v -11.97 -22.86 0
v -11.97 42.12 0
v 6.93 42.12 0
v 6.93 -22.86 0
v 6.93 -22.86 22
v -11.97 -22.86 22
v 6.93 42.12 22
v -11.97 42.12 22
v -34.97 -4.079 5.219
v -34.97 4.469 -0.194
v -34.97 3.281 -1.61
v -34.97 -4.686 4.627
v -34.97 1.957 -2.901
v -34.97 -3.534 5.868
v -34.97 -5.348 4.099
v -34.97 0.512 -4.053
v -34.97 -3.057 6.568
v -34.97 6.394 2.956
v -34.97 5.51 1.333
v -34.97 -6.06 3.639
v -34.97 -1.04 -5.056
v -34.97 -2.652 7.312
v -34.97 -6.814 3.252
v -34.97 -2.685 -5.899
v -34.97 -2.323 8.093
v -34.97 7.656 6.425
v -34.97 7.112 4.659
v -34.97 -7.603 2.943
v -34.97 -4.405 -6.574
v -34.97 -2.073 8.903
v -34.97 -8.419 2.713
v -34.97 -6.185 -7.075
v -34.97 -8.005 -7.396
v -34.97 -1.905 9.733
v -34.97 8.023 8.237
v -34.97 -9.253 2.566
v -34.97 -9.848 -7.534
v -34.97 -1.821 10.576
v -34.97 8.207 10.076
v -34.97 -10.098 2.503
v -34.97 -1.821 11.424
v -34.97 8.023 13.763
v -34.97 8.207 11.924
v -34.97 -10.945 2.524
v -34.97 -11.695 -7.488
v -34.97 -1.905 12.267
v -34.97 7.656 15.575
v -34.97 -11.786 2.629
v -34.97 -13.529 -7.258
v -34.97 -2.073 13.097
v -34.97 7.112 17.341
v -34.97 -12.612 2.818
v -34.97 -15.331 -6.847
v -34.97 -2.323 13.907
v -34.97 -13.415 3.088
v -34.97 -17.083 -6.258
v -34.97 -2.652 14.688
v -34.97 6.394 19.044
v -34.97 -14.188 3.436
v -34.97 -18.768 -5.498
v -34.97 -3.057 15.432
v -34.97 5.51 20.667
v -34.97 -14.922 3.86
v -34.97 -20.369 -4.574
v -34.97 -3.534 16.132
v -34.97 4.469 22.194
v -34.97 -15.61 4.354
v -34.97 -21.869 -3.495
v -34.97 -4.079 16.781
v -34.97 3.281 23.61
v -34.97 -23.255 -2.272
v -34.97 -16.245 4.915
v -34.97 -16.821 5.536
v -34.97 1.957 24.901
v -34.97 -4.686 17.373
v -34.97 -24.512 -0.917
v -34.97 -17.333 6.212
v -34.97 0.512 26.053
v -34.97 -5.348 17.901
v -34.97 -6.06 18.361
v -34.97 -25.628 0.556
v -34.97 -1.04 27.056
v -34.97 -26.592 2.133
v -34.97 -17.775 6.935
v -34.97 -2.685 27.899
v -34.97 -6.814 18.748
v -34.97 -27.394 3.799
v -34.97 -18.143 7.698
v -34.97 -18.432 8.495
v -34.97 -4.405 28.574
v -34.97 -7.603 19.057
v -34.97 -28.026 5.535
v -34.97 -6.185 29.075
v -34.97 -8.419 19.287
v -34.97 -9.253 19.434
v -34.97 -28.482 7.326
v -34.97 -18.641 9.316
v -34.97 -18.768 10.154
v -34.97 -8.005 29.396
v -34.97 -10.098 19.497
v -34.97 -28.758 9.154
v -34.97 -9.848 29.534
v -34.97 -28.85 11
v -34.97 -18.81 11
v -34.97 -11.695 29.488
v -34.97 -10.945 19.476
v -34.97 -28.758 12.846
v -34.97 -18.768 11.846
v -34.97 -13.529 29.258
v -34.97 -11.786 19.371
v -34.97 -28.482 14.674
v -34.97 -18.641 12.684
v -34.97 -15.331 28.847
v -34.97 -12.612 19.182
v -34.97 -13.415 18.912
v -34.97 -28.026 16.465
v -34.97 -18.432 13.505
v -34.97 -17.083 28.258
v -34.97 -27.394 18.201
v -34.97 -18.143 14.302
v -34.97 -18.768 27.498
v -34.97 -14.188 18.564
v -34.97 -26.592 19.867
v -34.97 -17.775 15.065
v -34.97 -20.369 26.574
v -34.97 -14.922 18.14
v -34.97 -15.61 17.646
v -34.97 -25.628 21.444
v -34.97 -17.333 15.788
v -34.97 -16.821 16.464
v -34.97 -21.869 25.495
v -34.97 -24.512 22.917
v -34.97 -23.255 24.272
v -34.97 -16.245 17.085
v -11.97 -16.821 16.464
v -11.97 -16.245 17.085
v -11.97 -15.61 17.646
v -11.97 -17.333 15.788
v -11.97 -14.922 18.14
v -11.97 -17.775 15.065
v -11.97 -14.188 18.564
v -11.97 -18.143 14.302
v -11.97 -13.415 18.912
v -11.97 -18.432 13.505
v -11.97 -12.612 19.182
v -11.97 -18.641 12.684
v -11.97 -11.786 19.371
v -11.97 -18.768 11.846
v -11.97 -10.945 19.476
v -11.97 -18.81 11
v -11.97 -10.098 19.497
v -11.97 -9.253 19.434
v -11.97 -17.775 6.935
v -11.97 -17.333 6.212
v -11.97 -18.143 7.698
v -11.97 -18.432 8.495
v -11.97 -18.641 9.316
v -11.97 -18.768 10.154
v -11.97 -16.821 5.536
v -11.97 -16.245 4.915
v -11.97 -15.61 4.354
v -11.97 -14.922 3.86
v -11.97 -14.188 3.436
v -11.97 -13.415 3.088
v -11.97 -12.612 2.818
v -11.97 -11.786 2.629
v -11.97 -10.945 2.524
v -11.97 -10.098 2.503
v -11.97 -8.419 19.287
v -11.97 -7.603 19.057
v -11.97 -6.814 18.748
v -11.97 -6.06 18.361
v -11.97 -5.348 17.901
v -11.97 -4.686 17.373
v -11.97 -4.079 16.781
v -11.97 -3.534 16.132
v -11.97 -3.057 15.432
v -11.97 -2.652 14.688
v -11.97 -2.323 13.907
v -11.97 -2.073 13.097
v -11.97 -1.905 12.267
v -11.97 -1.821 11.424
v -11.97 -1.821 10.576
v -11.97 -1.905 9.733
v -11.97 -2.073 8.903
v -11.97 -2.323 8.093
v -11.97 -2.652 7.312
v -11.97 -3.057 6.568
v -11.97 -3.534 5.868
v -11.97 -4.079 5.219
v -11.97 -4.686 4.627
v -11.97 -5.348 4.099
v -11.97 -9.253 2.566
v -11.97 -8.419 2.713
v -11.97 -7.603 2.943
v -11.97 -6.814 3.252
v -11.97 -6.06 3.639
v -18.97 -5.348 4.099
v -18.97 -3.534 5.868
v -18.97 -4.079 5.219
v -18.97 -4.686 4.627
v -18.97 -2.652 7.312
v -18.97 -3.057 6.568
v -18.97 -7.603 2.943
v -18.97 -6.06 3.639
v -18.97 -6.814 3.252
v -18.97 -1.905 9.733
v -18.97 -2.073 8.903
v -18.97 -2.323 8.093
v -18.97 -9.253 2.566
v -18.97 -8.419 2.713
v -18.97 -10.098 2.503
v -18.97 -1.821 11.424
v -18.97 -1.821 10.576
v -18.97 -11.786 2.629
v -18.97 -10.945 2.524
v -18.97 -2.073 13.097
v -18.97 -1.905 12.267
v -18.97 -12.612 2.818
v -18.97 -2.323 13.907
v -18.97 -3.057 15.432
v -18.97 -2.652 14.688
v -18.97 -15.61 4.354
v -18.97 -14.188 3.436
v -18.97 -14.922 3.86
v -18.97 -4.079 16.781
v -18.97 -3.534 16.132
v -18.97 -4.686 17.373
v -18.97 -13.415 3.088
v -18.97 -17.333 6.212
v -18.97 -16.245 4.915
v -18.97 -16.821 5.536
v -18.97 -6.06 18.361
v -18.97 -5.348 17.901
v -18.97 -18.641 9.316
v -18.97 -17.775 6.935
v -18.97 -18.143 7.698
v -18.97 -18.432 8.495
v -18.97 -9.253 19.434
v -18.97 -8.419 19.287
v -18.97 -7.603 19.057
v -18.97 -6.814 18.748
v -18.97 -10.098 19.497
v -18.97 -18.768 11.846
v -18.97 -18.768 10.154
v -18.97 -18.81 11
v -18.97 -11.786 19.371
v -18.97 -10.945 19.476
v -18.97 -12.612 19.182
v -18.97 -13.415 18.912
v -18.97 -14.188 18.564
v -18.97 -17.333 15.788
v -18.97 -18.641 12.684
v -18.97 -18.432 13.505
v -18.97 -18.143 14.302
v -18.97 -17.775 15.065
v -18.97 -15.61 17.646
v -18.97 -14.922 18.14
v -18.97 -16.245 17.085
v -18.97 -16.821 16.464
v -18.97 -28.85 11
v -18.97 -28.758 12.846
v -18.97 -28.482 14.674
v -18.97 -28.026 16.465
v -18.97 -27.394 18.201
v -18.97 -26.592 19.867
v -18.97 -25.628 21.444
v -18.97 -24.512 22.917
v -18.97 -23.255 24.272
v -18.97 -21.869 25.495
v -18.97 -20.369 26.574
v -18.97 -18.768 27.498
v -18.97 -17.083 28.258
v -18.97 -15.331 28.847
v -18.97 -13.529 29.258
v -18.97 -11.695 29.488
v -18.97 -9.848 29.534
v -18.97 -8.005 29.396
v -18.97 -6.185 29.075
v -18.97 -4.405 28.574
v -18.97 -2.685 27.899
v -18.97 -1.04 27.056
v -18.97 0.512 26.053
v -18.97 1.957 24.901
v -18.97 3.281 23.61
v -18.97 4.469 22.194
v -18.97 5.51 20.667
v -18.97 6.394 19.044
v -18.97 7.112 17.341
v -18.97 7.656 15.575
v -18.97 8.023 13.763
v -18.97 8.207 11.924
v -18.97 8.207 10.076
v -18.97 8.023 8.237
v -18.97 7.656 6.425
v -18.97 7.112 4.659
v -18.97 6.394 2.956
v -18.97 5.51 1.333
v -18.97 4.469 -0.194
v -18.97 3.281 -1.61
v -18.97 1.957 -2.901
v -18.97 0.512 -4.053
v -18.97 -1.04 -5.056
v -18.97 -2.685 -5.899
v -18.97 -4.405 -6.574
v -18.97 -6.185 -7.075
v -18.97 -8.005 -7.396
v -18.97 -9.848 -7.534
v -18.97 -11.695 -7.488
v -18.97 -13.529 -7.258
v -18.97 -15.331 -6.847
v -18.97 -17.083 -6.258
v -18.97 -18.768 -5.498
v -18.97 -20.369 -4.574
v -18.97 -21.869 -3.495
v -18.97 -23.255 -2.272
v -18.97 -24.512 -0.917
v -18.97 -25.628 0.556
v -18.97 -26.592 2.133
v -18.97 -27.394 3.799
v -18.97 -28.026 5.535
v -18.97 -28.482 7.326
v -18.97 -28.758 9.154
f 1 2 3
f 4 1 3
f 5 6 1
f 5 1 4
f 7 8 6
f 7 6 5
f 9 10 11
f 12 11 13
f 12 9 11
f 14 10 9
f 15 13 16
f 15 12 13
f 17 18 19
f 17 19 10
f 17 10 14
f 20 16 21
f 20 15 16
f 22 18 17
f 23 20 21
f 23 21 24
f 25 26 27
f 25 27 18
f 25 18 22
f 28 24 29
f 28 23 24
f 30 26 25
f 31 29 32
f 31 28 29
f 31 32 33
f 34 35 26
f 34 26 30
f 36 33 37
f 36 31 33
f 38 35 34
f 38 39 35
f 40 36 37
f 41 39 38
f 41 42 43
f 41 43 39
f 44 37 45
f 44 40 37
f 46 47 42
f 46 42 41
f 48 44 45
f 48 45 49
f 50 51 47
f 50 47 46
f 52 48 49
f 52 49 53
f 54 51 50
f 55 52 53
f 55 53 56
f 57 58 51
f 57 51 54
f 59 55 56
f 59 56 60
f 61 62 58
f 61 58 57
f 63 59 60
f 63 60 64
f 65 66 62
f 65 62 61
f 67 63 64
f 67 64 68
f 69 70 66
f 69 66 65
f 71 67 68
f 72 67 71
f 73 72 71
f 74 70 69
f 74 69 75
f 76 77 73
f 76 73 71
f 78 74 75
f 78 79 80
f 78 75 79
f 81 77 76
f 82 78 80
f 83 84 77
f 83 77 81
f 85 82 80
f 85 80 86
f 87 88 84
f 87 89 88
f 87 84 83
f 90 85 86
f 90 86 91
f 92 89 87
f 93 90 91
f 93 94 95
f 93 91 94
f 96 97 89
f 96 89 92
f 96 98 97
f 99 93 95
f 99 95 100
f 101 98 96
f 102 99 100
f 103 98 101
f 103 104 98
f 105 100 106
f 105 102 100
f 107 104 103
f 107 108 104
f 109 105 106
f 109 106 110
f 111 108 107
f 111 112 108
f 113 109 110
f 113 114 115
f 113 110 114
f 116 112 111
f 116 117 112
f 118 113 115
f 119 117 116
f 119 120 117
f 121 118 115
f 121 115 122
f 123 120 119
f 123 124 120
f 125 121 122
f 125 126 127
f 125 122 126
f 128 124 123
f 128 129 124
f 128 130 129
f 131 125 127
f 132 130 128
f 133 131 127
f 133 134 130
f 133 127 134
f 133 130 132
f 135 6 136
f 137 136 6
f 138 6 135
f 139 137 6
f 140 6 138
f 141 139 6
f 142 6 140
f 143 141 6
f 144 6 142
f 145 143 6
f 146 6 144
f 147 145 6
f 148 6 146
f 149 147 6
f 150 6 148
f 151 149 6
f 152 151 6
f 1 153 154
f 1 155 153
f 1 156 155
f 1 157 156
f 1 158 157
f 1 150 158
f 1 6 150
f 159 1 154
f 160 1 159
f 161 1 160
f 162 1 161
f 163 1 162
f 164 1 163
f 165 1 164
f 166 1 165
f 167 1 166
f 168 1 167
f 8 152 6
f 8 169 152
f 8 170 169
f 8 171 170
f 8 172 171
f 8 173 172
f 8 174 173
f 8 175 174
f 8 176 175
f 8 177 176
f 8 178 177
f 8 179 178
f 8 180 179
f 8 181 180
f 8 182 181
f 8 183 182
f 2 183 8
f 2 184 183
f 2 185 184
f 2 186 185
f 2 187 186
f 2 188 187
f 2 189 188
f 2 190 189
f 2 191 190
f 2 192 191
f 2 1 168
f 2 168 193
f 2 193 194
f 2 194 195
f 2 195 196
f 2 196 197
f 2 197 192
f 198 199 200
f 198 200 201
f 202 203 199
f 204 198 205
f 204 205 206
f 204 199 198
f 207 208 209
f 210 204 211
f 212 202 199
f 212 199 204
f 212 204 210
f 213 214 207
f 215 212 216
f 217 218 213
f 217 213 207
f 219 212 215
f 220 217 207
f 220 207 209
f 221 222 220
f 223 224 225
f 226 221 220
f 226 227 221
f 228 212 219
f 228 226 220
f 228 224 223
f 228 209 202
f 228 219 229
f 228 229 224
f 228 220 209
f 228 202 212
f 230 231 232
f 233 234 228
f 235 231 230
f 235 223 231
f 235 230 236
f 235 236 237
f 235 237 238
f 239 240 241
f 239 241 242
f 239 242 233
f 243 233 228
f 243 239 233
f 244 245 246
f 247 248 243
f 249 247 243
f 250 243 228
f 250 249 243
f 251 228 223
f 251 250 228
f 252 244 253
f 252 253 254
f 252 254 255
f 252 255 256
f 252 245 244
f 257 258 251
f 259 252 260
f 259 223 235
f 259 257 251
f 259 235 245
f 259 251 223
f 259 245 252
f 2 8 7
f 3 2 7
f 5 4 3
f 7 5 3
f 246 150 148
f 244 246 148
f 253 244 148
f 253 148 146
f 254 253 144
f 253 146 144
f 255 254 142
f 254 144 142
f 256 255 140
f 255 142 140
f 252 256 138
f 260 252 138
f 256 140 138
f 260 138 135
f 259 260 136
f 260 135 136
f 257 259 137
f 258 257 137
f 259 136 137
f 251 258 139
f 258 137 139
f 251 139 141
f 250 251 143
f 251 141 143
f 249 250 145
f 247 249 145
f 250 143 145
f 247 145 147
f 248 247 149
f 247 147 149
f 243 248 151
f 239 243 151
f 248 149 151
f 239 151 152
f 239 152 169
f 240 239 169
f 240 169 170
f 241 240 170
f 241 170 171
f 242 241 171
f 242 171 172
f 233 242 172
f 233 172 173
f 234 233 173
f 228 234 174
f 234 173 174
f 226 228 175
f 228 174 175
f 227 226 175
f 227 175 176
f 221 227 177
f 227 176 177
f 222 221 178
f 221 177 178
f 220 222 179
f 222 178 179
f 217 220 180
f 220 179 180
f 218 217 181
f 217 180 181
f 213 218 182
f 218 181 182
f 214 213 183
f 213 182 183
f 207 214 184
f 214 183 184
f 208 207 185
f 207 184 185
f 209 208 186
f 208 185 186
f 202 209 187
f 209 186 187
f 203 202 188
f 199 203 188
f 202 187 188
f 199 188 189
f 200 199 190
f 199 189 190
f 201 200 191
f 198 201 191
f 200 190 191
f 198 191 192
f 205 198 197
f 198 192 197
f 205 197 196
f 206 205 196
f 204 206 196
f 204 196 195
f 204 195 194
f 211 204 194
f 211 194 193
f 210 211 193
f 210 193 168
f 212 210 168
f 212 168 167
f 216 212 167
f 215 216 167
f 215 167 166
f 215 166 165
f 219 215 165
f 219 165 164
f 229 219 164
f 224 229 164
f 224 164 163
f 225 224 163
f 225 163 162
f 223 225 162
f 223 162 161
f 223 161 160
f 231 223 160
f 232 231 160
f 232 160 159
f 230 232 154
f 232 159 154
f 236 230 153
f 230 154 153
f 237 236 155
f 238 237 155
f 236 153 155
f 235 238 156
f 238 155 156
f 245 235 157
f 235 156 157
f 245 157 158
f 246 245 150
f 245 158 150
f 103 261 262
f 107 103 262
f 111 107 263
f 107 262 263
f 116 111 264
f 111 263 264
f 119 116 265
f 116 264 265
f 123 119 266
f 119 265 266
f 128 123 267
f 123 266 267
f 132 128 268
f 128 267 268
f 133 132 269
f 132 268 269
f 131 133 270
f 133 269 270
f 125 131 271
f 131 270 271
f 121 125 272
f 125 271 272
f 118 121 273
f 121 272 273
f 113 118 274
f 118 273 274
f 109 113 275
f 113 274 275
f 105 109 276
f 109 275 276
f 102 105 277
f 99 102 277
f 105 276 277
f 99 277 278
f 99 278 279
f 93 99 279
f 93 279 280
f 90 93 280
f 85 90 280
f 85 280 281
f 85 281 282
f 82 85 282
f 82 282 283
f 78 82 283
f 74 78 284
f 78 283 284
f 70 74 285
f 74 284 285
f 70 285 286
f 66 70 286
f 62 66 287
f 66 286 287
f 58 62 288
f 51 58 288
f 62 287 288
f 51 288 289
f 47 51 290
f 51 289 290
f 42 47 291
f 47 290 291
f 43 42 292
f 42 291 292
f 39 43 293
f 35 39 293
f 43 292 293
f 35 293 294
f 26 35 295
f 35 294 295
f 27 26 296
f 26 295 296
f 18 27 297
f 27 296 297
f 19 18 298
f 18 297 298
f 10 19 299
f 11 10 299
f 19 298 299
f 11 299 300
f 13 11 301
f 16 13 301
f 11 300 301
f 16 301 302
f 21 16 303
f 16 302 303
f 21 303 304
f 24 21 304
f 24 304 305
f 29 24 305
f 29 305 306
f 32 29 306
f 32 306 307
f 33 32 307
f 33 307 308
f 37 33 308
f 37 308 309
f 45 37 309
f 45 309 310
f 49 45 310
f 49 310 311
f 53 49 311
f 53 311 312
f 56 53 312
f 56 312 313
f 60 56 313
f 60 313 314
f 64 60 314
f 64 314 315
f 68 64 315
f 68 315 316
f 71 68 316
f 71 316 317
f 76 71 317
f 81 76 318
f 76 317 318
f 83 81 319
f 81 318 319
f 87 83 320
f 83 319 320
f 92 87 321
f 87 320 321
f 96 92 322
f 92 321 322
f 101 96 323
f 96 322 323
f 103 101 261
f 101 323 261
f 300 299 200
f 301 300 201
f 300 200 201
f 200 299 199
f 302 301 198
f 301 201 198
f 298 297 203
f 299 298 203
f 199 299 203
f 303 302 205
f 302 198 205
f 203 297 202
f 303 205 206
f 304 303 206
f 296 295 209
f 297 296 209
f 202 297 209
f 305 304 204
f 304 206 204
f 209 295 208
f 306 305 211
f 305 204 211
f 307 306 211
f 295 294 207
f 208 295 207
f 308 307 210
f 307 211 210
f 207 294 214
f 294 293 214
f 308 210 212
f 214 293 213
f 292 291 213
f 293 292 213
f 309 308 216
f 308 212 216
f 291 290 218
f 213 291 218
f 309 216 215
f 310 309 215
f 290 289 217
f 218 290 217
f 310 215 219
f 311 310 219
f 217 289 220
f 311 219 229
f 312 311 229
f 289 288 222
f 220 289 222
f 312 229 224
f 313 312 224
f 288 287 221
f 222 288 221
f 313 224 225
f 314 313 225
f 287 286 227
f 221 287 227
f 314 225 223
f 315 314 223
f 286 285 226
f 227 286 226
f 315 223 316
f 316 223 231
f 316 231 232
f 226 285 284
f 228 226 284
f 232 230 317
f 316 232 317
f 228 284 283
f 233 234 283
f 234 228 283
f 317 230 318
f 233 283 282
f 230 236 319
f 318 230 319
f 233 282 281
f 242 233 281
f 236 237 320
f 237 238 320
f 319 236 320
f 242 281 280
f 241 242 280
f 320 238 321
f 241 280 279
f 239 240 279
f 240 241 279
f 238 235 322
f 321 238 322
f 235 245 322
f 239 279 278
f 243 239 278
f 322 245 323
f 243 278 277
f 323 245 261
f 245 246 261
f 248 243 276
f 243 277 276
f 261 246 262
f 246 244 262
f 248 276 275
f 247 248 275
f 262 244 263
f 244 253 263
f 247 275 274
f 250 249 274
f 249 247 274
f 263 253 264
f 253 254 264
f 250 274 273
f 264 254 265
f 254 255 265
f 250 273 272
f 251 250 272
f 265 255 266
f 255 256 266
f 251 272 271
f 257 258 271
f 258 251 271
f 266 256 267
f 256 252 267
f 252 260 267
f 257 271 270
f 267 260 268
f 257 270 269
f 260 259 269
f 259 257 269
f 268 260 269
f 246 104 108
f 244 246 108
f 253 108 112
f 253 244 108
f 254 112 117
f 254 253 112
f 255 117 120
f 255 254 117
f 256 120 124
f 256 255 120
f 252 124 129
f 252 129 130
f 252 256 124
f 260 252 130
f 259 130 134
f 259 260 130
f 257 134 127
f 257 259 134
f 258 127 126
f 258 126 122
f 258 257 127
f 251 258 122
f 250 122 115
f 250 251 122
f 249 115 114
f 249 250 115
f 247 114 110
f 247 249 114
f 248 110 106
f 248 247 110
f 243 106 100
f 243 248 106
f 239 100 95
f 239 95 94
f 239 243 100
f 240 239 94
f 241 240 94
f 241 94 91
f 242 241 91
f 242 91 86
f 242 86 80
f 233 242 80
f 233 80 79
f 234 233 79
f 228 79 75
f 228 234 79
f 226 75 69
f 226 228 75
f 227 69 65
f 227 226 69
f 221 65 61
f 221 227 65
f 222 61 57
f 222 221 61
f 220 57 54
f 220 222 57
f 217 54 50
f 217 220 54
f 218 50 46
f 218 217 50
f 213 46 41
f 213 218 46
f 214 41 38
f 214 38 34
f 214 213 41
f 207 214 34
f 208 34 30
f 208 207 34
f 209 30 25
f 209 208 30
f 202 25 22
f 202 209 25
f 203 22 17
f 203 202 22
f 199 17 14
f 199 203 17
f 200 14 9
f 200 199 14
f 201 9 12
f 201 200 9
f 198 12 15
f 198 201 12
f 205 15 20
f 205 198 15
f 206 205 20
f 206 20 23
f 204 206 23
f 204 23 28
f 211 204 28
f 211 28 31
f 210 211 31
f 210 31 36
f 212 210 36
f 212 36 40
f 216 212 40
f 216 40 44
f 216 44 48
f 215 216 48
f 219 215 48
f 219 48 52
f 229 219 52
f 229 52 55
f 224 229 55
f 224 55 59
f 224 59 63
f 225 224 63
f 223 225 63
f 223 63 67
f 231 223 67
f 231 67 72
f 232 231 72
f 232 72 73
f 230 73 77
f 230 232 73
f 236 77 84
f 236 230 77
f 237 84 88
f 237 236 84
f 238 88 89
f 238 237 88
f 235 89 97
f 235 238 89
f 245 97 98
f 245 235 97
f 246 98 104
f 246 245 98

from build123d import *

# Parameters (mm, degrees)
F0_W     = 18.9000009559
F0_H     = 64.9800021201
F1_DEPTH = 22
F2_R     = 8.5
F3_DEPTH = 7
F4_R     = 18.539660173
F4_R_2   = 8.5
F5_DEPTH = 16


with BuildPart() as f1:
    # F0 (on Top) → F1 (new body)
    with BuildSketch(Plane.XY):
        with Locations((-2.5199998636, 9.6300011501)):
            Rectangle(F0_W, F0_H)
    extrude(amount=F1_DEPTH)

    # F2 (on face) → F3 (join)
    with BuildSketch(Plane(origin=(-11.9700003415, 0, 0), x_dir=(0, -1, 0), z_dir=(-1, 0, 0))):
        with Locations((10.3100002706, 11)):
            Circle(F2_R)
    extrude(amount=F3_DEPTH)


with BuildPart() as f5:
    # F4 (on face) → F5 (new body)
    with BuildSketch(Plane(origin=(-18.9700003415, 0, 0), x_dir=(0, -1, 0), z_dir=(-1, 0, 0))):
        with Locations((10.3100002706, 11)):
            Circle(F4_R)
        with Locations((10.3100002706, 11)):
            Circle(F4_R_2, mode=Mode.SUBTRACT)
    extrude(amount=F5_DEPTH)


solid = Compound([f1.part, f5.part])
